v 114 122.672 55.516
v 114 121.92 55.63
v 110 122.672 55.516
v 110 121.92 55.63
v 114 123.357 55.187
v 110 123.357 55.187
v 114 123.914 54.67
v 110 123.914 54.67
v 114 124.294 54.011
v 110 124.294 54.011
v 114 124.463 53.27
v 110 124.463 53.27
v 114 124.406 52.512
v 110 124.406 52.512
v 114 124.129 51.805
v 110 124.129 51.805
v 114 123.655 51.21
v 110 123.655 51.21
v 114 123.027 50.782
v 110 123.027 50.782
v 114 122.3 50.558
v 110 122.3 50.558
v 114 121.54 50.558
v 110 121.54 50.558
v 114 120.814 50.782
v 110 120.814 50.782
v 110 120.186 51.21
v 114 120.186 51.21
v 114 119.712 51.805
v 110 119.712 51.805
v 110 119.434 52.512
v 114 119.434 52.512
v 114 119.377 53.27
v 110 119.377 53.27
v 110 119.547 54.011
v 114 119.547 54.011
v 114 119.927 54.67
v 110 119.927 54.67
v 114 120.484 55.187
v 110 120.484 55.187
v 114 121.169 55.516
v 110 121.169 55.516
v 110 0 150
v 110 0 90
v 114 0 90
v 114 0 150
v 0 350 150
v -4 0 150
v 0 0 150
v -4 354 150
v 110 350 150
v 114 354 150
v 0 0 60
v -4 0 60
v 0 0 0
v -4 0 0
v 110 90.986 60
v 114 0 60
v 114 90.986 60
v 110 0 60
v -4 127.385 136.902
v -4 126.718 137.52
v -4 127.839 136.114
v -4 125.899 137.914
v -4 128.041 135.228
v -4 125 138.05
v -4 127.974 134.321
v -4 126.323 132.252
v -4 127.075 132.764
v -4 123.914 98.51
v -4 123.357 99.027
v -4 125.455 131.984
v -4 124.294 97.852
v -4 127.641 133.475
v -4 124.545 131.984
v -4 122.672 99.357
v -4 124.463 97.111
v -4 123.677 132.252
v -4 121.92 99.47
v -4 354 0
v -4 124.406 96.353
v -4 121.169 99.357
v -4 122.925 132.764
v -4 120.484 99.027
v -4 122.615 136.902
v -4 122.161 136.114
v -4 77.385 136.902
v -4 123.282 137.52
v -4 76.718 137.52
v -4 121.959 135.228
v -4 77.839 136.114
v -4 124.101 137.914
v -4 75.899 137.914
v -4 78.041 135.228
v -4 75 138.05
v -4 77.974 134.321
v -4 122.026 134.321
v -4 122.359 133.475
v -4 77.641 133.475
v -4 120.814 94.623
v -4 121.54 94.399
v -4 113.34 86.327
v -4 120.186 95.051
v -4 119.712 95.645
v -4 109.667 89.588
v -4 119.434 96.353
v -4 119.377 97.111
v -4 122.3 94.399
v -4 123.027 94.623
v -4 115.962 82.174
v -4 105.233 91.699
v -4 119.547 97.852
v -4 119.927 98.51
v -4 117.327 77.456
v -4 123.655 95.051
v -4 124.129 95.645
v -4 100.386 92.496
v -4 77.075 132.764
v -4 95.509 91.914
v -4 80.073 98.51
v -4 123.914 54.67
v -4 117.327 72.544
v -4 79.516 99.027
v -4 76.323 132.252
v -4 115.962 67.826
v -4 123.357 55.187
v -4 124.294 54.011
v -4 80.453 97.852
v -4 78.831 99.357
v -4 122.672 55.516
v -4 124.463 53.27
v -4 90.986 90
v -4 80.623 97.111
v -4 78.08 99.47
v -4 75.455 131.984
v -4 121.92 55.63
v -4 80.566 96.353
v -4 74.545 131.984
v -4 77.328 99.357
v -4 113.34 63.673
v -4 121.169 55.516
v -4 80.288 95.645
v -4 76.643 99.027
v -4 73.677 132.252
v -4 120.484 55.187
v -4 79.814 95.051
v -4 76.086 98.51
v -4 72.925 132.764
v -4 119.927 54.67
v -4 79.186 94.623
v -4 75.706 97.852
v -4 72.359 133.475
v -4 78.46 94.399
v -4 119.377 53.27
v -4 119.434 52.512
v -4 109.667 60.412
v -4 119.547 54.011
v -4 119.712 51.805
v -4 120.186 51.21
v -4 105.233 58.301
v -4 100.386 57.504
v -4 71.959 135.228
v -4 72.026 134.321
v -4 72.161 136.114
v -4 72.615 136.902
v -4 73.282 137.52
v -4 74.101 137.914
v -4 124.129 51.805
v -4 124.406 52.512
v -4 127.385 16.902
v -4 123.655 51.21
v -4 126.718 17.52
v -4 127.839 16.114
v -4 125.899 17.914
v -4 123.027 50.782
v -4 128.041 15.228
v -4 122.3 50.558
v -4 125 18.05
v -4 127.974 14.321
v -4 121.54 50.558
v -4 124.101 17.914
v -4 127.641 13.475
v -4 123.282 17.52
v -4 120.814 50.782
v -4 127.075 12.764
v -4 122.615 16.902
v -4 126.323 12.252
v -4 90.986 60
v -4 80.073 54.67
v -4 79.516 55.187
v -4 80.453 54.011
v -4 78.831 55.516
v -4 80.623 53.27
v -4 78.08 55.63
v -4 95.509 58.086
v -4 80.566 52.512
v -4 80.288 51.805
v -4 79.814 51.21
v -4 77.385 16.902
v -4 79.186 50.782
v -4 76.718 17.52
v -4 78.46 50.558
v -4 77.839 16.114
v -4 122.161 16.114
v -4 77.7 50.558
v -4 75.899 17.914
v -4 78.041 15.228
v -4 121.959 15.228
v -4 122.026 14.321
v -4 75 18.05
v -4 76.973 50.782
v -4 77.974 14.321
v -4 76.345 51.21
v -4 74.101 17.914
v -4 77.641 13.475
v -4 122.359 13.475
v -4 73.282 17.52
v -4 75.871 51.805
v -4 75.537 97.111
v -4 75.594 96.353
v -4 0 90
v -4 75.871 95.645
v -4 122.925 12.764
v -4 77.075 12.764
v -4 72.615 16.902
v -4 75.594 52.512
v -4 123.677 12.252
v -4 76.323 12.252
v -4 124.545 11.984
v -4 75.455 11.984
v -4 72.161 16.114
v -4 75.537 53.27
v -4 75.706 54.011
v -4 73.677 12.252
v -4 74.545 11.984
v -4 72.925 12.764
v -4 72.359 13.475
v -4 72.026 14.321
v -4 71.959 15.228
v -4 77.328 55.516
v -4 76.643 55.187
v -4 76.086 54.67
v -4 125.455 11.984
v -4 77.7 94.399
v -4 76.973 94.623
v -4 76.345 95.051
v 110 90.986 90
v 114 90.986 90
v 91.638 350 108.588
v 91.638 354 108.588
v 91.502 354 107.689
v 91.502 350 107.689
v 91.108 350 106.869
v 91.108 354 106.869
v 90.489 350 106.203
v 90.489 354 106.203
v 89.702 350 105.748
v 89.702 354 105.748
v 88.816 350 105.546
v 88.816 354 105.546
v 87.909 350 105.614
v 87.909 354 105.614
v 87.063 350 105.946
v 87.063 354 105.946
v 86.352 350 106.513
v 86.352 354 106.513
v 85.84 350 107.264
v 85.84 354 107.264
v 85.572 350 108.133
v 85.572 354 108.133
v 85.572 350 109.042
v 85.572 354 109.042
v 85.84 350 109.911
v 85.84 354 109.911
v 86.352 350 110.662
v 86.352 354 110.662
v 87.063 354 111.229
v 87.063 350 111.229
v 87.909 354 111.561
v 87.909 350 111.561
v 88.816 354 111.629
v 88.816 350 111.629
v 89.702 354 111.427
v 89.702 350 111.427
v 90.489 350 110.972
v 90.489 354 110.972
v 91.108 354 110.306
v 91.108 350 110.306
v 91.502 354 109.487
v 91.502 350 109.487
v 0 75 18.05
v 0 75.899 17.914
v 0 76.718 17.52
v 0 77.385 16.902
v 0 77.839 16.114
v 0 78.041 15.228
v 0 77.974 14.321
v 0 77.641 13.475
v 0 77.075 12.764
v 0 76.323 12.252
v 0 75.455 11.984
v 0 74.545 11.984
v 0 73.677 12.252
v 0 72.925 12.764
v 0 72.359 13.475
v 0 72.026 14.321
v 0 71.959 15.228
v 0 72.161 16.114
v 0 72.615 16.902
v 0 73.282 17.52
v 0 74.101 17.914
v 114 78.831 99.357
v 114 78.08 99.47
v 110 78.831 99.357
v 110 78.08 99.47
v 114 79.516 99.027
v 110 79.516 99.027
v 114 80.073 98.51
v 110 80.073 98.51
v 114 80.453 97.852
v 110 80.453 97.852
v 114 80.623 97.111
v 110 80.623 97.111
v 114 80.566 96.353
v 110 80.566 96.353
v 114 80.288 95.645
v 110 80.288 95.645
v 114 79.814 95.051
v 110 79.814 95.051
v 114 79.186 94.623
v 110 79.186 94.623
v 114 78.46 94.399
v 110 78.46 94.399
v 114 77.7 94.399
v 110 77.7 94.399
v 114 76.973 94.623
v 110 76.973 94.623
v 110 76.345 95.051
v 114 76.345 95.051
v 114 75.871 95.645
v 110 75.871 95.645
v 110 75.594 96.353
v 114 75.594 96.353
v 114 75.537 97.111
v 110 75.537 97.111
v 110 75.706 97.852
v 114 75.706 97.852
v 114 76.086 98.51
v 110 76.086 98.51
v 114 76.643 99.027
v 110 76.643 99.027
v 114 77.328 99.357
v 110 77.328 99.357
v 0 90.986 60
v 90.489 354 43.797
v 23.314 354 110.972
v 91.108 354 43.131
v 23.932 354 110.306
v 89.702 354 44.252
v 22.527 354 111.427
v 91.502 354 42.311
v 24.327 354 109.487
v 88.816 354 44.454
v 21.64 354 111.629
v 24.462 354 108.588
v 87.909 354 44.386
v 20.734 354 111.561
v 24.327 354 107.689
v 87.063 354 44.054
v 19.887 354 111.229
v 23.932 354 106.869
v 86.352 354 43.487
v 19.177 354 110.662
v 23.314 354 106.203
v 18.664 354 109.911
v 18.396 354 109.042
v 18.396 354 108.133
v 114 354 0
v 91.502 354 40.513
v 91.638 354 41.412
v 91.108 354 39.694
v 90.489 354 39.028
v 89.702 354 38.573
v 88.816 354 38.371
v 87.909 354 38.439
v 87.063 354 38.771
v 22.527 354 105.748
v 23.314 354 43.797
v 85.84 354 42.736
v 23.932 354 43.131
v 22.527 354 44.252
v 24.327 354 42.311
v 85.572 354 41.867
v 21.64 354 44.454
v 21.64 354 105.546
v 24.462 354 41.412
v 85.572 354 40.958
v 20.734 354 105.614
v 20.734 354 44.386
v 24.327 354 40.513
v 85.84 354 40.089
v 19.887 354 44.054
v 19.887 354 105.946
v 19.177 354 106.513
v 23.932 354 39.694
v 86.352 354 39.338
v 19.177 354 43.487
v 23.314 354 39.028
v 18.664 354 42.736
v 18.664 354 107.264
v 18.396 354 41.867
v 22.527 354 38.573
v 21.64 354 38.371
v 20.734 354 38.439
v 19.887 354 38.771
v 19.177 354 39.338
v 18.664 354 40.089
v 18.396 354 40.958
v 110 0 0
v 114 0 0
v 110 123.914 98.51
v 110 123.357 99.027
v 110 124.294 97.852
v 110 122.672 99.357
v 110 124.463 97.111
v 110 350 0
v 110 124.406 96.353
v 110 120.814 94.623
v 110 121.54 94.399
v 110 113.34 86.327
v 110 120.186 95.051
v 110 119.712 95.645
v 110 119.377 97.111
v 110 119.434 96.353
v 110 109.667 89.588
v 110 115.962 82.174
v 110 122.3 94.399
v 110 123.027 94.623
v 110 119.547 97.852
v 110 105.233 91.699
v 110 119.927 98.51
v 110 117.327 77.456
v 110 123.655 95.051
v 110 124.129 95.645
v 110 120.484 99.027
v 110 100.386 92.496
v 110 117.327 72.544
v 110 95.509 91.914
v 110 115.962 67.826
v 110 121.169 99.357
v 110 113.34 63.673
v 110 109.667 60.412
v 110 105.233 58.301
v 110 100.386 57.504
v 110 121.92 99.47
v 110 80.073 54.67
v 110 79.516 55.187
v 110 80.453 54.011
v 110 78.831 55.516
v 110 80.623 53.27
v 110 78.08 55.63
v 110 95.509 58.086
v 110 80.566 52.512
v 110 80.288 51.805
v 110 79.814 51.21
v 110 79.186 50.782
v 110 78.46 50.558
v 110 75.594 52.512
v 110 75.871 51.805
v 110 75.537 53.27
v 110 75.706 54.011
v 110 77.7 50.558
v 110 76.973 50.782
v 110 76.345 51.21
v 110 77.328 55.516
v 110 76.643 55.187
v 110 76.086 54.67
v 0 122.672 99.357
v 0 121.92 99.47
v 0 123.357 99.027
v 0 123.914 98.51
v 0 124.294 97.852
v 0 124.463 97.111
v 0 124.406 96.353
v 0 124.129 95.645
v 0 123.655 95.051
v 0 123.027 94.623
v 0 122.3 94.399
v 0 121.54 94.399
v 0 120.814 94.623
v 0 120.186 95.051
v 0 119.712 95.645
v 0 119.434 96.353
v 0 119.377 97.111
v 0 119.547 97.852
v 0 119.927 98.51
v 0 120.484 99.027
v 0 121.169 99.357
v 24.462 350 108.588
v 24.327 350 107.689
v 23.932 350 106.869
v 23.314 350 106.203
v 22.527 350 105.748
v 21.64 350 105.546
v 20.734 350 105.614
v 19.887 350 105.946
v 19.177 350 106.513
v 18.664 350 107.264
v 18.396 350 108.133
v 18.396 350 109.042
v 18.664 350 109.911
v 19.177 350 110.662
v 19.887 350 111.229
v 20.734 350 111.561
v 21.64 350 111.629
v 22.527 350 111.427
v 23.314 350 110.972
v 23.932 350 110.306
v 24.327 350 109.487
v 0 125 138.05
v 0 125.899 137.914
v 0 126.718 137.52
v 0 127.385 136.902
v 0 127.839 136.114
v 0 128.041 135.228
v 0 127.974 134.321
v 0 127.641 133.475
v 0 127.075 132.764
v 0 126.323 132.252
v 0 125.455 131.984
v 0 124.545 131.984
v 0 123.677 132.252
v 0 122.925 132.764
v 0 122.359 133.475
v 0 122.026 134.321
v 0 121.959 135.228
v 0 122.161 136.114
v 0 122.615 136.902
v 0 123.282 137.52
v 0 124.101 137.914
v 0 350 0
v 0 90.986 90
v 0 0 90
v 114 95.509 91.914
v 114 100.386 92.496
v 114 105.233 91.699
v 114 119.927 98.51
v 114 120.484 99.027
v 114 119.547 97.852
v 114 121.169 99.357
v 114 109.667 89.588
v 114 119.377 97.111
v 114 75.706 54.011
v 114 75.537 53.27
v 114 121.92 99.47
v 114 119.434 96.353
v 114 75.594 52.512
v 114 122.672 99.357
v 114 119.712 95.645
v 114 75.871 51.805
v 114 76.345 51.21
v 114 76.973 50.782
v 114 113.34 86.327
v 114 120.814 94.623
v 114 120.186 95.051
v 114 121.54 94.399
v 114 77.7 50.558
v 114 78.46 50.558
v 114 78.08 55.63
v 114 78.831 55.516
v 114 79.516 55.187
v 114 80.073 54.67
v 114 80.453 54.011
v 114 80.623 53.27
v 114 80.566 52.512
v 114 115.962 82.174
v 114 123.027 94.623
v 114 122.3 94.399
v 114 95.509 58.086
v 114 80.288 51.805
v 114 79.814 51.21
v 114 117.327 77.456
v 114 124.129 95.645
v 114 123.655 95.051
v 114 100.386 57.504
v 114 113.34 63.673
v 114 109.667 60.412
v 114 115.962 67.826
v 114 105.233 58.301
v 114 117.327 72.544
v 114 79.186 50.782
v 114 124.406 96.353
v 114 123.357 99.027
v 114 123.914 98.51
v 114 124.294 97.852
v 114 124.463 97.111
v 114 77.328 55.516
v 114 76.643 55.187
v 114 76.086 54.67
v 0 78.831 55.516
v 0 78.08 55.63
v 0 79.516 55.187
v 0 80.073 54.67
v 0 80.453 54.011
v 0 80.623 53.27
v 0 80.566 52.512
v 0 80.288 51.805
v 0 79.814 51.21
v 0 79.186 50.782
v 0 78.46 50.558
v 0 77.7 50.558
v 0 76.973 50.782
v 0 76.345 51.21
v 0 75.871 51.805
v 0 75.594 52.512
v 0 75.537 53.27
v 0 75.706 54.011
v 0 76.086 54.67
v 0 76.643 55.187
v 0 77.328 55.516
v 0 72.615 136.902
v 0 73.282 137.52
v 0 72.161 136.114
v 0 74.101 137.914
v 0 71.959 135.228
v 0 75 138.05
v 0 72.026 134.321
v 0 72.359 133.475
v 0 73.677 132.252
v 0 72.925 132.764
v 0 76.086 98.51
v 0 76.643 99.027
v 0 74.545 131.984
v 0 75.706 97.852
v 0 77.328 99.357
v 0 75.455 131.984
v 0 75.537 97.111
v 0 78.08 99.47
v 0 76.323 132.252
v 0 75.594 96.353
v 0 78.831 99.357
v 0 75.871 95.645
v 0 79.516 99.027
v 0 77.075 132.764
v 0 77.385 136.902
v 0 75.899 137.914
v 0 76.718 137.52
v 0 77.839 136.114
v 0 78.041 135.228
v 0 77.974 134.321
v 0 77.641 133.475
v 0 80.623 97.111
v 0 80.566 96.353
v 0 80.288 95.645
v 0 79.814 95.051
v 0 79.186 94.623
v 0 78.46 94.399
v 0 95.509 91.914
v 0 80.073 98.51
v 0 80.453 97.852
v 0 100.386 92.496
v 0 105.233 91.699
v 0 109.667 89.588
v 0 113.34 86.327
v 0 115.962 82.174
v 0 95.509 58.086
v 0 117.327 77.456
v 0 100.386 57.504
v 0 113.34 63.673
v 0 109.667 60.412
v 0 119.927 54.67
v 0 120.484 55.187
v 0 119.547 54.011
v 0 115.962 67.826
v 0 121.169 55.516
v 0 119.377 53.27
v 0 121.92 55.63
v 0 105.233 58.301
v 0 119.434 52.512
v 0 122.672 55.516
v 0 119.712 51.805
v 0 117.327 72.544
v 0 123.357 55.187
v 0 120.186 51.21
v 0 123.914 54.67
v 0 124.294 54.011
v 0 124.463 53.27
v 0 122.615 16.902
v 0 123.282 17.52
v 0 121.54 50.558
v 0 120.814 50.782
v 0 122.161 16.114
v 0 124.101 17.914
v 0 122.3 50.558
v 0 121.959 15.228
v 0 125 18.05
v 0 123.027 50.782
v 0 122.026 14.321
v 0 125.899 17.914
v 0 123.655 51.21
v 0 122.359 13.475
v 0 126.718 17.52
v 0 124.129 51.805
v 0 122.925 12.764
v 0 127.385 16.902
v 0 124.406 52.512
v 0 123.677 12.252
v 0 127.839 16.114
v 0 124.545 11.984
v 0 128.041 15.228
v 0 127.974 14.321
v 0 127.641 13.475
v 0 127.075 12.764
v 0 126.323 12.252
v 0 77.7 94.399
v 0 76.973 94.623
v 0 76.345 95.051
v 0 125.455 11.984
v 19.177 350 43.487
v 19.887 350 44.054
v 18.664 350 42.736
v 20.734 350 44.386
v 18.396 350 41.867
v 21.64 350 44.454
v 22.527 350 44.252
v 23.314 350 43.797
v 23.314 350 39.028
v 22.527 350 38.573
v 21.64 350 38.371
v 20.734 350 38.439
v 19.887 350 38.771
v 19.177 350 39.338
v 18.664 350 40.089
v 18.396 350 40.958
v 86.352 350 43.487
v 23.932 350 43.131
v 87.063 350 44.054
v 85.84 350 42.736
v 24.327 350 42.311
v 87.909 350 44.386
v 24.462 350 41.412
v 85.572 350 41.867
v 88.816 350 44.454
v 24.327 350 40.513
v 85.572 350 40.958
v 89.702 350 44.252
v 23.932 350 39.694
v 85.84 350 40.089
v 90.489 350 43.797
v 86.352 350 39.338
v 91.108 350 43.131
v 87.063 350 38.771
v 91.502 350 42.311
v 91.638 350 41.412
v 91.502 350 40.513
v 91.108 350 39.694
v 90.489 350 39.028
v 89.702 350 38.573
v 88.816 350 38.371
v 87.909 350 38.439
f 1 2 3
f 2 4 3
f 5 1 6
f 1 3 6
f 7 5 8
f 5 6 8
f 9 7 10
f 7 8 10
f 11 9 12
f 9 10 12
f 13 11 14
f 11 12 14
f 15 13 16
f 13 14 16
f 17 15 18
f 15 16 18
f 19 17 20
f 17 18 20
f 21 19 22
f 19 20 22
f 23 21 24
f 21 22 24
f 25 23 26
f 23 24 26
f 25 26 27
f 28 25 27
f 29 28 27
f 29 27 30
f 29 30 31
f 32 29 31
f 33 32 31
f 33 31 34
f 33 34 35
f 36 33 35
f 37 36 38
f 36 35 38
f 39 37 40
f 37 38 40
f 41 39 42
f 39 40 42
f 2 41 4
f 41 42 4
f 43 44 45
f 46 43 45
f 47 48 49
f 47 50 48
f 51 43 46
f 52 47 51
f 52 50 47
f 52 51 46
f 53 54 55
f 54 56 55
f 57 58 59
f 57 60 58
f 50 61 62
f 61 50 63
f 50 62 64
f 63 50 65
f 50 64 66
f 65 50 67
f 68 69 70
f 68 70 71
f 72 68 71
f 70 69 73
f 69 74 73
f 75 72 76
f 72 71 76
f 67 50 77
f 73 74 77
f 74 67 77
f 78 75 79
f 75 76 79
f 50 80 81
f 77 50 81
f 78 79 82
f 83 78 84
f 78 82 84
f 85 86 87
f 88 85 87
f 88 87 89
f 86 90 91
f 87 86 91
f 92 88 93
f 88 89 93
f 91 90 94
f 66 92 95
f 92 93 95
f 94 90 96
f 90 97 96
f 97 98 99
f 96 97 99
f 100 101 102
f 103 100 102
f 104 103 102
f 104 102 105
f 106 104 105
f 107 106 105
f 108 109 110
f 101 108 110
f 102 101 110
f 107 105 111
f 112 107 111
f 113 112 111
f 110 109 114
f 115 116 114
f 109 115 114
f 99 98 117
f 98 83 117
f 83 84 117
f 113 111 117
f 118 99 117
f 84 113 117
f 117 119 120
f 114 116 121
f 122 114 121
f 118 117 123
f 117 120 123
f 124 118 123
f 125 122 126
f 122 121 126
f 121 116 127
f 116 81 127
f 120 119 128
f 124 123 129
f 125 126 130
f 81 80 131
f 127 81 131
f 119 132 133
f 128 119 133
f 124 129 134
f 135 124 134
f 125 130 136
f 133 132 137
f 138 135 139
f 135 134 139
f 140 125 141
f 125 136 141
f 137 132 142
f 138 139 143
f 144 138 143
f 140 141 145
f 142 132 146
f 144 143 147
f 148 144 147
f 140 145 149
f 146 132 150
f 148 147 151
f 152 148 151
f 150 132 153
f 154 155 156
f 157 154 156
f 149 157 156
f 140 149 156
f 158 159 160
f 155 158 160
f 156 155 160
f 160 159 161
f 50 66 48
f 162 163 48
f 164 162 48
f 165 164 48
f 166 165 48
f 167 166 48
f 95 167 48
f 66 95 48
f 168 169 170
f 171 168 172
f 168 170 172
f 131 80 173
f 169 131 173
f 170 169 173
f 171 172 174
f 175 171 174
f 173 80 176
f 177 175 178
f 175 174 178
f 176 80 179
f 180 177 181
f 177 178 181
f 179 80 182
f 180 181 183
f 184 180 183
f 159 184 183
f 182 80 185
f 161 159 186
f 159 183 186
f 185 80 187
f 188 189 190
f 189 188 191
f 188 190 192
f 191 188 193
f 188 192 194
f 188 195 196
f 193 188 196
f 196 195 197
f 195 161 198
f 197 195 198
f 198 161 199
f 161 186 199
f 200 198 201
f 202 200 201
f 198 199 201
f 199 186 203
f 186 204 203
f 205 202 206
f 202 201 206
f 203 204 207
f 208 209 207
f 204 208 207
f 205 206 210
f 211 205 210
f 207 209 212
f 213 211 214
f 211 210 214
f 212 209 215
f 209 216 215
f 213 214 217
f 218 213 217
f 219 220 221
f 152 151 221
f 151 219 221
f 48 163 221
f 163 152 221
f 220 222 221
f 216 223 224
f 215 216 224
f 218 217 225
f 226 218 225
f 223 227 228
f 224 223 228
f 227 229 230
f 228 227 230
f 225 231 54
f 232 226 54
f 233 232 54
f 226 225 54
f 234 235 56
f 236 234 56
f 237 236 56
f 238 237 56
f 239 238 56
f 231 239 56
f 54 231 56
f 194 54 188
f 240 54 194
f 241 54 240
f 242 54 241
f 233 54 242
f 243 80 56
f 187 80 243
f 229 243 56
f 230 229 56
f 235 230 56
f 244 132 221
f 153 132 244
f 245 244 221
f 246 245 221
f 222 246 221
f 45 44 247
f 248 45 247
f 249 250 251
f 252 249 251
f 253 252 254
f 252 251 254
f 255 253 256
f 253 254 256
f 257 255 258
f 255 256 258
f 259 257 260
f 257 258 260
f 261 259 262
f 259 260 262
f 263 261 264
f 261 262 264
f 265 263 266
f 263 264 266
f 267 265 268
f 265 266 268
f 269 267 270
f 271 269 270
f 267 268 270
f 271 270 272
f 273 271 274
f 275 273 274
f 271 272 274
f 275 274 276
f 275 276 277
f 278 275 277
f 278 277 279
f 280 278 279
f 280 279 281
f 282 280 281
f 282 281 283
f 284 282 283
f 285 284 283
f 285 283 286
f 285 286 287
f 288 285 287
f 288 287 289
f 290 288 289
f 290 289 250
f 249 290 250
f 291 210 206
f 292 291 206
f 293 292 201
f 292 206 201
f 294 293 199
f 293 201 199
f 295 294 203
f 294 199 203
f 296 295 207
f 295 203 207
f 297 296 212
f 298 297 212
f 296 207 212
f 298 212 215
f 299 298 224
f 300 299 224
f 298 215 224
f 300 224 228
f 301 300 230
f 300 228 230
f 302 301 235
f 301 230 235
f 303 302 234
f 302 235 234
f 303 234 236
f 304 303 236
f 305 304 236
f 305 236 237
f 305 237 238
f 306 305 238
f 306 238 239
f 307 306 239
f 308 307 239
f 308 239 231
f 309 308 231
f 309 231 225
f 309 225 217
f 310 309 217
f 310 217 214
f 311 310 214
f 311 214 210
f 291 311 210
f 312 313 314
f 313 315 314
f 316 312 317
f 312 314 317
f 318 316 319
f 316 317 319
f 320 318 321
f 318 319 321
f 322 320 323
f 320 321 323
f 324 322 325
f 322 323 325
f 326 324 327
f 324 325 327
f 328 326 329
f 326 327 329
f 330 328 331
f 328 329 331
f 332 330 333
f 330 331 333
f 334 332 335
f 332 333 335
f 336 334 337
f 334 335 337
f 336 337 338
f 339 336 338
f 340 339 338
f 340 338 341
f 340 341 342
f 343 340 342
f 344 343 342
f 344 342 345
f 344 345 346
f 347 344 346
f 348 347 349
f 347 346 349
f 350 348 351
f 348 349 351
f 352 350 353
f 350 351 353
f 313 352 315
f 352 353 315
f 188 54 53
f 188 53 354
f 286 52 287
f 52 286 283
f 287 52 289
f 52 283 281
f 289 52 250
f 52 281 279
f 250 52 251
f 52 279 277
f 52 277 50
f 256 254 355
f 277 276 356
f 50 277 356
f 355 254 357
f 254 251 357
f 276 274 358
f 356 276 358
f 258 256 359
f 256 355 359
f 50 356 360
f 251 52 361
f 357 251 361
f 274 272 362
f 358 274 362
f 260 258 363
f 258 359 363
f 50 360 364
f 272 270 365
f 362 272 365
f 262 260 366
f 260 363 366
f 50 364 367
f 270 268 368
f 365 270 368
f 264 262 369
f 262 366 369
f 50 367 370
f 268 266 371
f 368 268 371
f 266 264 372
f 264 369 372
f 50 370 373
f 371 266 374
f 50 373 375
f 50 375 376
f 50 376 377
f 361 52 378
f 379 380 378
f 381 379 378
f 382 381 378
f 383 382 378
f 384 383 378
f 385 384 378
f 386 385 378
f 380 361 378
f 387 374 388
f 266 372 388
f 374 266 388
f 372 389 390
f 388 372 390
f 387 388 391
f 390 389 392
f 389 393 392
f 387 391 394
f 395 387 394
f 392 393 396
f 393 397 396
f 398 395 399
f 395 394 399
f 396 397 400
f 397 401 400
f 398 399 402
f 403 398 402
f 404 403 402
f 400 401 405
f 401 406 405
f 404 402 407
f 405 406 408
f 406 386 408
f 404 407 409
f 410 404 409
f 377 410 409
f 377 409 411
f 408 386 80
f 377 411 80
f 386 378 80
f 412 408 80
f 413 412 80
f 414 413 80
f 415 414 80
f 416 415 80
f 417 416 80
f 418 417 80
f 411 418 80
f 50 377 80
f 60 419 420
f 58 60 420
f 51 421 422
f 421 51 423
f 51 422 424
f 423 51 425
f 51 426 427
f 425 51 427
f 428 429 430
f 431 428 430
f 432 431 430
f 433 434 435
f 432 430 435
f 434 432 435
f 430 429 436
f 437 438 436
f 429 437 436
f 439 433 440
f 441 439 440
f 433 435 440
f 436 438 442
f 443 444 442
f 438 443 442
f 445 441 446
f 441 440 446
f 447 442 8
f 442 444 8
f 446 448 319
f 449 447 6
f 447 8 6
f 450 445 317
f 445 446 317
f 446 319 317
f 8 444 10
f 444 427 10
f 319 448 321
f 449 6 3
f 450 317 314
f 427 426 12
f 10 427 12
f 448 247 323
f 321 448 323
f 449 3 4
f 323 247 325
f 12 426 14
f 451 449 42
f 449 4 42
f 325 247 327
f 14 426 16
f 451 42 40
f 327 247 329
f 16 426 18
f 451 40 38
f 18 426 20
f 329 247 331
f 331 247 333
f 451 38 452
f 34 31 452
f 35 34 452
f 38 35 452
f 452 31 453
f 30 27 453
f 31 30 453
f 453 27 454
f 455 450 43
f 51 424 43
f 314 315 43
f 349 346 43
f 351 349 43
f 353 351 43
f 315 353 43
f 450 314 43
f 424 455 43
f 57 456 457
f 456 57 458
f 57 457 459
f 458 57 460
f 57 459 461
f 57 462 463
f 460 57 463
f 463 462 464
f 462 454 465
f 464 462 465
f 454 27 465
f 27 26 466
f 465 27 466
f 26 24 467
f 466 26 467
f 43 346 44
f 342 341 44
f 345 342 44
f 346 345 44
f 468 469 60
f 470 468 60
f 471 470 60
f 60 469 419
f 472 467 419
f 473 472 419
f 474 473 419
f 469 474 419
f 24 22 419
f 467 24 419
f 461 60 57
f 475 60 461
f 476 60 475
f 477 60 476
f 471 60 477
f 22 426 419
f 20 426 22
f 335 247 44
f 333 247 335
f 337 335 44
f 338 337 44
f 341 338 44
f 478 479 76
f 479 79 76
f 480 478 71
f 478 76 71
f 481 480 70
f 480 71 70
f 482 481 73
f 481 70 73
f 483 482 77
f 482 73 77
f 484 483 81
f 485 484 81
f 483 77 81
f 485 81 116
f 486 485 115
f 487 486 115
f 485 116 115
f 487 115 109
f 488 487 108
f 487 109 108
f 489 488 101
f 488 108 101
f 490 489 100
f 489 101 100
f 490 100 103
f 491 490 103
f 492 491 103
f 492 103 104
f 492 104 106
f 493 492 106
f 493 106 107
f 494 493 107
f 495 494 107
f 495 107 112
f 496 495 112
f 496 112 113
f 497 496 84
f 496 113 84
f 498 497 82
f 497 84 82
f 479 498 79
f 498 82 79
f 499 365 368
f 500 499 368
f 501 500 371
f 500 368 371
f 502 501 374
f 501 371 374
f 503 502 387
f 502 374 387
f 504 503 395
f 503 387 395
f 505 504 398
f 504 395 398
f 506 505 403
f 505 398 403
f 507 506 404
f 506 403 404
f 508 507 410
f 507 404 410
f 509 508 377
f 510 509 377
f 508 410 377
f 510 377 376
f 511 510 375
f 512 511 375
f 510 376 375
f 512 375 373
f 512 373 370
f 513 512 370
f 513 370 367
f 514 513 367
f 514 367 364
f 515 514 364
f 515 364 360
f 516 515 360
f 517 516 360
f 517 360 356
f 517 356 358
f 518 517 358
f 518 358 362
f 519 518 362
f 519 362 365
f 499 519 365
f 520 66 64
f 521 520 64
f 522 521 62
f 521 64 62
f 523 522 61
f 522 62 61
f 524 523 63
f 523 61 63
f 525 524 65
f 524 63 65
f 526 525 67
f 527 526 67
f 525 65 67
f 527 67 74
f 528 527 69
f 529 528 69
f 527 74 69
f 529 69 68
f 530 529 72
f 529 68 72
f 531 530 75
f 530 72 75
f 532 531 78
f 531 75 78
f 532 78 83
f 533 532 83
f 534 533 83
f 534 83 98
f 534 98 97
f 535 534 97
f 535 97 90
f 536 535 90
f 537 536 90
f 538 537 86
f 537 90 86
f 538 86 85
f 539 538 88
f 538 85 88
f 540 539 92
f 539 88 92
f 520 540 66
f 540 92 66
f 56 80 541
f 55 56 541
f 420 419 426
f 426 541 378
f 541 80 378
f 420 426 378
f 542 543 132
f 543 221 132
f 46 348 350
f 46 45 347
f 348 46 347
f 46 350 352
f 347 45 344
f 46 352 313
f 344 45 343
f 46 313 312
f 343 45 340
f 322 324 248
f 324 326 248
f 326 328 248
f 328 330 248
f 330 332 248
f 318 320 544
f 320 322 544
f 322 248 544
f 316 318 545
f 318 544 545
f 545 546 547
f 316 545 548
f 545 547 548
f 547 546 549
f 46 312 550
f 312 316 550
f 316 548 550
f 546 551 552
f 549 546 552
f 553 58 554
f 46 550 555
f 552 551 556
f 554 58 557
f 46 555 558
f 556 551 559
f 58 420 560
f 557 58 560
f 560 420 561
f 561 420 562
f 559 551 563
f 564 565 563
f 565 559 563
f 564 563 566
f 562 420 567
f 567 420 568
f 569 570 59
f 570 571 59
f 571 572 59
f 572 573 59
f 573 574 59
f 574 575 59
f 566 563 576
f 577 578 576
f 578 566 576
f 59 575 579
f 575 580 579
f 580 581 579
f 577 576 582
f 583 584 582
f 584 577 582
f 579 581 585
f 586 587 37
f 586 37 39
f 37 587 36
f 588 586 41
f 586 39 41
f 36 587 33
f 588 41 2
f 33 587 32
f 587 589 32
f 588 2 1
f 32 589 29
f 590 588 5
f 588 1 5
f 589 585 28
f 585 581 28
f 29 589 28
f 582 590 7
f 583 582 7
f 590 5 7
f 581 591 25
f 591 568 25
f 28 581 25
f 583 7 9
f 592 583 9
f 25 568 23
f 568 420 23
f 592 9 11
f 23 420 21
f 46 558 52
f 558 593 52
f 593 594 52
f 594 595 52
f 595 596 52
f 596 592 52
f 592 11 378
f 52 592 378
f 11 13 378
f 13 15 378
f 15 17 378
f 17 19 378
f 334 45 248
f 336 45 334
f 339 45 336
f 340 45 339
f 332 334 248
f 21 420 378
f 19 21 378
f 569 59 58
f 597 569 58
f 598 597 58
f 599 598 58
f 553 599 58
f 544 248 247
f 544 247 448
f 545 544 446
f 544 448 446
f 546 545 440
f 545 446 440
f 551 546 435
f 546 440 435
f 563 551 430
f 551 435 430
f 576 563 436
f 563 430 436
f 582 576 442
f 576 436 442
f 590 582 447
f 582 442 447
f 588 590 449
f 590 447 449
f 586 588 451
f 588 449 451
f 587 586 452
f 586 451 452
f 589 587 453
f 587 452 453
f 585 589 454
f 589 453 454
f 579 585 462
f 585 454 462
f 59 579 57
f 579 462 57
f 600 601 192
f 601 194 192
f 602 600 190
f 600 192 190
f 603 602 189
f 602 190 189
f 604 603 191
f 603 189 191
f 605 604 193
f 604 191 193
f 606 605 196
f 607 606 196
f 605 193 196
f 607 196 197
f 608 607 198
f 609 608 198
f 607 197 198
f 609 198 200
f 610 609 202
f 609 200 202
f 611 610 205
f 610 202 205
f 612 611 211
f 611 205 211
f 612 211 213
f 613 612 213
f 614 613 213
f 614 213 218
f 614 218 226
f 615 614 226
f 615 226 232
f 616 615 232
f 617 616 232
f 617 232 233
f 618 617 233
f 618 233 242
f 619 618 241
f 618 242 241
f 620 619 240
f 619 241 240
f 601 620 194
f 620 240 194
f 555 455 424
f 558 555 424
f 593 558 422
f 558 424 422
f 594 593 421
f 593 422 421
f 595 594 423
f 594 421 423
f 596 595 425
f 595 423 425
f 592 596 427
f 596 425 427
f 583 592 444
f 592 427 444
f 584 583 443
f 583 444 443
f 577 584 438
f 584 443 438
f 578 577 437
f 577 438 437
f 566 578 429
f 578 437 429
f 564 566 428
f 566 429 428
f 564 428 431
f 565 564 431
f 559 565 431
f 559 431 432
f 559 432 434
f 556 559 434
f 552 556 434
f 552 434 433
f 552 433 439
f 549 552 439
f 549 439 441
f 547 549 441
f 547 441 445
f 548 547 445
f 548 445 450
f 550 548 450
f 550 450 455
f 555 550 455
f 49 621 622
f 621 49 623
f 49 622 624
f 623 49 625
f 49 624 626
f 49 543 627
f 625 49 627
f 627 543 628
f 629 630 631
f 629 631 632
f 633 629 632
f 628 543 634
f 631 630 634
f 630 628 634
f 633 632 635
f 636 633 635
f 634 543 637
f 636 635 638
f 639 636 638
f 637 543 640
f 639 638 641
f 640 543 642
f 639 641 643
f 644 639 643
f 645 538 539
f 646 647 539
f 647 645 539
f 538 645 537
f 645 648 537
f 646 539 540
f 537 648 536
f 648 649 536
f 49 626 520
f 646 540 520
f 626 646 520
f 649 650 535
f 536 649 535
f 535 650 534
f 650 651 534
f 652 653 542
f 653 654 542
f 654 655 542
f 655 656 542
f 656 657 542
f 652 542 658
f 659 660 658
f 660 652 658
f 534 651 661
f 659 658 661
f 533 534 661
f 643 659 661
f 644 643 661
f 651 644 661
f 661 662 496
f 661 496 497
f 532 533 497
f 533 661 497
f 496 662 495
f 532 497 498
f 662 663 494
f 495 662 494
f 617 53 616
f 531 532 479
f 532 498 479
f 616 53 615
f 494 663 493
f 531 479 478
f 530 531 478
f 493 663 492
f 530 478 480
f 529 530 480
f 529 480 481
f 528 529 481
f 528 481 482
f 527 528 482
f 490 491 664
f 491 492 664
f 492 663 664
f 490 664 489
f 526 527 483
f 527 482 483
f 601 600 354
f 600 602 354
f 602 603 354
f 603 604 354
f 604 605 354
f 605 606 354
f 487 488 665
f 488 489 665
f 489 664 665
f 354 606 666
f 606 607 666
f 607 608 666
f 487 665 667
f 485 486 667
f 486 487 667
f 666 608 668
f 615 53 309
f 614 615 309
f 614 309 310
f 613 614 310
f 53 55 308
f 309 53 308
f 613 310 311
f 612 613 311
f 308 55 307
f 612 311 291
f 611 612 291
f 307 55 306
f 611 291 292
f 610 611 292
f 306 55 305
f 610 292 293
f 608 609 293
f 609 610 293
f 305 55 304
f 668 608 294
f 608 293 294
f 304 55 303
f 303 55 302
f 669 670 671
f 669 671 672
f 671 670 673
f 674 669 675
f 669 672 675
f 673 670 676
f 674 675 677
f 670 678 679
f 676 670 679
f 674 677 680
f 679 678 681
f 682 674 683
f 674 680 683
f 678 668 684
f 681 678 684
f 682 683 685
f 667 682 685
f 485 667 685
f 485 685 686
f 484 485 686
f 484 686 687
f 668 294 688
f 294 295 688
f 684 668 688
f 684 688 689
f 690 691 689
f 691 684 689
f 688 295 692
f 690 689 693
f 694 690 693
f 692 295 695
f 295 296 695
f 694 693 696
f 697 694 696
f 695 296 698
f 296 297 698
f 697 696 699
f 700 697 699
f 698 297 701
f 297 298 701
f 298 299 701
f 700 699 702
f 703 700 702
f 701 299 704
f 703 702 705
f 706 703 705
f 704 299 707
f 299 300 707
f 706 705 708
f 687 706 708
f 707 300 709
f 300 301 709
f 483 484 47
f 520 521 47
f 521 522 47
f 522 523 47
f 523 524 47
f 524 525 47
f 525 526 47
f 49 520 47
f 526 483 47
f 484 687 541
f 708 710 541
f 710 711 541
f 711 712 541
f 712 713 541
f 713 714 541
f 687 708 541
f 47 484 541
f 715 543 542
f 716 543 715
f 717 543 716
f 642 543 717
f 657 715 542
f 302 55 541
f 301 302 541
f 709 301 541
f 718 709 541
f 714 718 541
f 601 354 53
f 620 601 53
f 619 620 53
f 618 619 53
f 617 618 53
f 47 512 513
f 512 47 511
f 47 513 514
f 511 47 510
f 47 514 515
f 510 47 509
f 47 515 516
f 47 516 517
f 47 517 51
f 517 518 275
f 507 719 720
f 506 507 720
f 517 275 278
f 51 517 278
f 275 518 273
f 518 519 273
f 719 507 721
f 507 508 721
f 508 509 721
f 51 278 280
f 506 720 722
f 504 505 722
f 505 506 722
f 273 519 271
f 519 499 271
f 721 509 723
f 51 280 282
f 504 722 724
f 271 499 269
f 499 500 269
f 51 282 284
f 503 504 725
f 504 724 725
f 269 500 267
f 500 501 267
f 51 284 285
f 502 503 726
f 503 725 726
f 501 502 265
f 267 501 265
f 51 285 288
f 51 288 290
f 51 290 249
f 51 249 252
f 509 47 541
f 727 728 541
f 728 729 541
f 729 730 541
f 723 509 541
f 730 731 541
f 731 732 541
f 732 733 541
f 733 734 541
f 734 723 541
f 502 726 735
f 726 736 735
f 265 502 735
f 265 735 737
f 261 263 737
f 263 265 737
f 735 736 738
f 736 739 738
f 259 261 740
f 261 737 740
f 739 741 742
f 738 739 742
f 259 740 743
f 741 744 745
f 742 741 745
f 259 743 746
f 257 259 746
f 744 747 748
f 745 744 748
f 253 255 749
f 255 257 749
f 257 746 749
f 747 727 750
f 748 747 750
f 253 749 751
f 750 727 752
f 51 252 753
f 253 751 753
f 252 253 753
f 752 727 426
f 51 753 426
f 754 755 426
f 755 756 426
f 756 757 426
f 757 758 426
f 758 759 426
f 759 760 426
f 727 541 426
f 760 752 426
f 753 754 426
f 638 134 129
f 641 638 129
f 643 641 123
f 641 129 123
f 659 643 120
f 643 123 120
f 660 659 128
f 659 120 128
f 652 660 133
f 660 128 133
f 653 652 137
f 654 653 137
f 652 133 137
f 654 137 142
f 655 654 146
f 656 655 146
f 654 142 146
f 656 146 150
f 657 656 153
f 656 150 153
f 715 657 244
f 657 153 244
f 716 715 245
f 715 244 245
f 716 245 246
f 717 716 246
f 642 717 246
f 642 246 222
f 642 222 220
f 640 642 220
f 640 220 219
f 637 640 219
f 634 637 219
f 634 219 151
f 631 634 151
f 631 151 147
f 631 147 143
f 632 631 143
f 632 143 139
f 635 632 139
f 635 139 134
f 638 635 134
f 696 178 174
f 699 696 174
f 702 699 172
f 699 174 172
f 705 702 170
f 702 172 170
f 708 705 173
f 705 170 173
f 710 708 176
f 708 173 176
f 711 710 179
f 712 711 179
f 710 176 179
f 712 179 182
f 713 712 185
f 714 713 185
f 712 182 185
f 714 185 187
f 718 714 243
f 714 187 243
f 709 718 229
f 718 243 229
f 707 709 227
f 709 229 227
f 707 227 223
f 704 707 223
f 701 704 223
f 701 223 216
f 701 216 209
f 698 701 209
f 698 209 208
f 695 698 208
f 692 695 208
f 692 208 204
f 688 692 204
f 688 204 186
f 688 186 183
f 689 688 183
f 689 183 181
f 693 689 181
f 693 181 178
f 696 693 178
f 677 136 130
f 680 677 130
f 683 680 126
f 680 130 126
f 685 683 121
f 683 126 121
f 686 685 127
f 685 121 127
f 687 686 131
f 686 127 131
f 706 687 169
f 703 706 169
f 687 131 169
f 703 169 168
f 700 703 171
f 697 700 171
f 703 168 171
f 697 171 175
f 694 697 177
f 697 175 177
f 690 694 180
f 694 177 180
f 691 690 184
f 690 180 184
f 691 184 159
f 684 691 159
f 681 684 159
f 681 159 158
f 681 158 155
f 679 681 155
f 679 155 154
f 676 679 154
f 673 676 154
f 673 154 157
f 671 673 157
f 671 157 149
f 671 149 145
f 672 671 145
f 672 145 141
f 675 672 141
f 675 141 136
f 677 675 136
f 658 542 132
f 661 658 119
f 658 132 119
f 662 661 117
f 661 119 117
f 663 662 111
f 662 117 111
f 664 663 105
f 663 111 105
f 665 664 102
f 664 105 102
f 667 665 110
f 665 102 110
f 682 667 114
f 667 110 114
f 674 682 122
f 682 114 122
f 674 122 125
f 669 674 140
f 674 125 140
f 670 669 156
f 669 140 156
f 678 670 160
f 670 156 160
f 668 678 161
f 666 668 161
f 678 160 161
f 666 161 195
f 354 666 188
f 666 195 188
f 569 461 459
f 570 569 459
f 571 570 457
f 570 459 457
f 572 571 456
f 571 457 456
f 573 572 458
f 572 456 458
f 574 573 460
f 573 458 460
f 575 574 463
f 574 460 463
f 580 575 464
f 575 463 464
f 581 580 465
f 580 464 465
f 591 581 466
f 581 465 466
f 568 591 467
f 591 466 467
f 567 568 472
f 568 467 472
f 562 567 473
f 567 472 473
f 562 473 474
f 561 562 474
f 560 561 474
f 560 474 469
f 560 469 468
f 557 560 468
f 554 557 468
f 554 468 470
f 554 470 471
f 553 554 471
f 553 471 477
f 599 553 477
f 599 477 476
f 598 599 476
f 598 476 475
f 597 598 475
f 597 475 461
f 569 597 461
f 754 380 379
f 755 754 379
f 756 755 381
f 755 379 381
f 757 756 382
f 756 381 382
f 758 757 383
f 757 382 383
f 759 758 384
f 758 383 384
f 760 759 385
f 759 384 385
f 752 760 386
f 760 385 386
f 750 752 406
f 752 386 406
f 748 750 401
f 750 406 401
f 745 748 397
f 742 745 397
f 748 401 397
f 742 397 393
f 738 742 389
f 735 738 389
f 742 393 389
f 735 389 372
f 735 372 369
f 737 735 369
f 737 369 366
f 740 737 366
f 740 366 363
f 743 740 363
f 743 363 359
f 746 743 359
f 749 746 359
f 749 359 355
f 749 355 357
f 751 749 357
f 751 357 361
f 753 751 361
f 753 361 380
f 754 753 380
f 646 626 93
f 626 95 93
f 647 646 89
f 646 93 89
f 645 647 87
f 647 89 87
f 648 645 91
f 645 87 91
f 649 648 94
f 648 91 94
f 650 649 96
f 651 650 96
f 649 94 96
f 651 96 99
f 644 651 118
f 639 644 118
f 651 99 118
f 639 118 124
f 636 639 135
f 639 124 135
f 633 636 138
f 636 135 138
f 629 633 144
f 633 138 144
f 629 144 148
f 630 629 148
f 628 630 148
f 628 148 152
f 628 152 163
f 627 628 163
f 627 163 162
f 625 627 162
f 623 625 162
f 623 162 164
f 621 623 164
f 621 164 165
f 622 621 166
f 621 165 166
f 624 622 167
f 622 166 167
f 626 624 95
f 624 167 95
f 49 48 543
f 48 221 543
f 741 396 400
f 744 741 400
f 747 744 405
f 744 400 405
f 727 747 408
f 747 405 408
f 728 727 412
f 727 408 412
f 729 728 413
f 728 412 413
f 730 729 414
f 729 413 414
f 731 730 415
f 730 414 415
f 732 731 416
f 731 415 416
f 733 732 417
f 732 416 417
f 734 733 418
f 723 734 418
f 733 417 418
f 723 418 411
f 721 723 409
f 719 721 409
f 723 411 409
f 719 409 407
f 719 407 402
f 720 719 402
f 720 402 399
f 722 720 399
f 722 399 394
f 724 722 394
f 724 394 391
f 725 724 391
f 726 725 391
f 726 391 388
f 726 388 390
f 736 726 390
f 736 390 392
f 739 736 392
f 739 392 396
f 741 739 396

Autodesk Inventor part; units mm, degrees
ref_plane "YZ Plane" through (0, 0, 0) normal (1, 0, 0) x (0, 1, 0)
ref_plane "XZ Plane" through (0, 0, 0) normal (0, 1, 0) x (-1, 0, 0)
sketch "Sketch1" plane through (0, 0, 0) normal (0, 0, 1) x (1, 0, 0)
  line L0 (0, 0) -> (0, 350)
  line L1 (0, 350) -> (110, 350)
  line L2 (110, 350) -> (110, 0)
  line L3 (114, 0) -> (114, 354)
  line L4 (114, 354) -> (-4, 354)
  line L5 (-4, 354) -> (-4, 0)
  line L6 (-4, 0) -> (0, 0)
  line L7 (110, 0) -> (114, 0)
  dimension "d0" = 350
  dimension "d1" = 110
  dimension "d2" = 4
extrude "Extrusion1" add sketch "Sketch1" along normal blind 150
sketch "Sketch2" plane through (-4, 0, 0) normal (-1, 0, 0) x (0, 0, 1)
  line L0 (0, 354) -> (150, 354) projected
  line L1 (0, 0) -> (150, 0) projected
  line L2 (75, 0) -> (75, 100) construction
  circle A0 centre (75, 100) radius 17.5
  line L3 (60, 0) -> (60, 90.9861)
  line L4 (90, 0) -> (90, 90.9861)
  circle A1 centre (100, 100) radius 31 construction
  line L5 (75, 100) -> (53.0797, 121.9203) construction
  circle A2 centre (53.0797, 121.9203) radius 2.55
  circle A3 centre (53.0797, 78.0797) radius 2.55
  circle A4 centre (96.9203, 78.0797) radius 2.55
  circle A5 centre (96.9203, 121.9203) radius 2.55
  point P0 (60, 0)
  point P1 (90, 0)
  dimension "d5" = 100
  dimension "d6" = 15
  dimension "d7" = 15
  dimension "d12" = 35
  dimension "d13" = 62
  dimension "d23" = 5.1
  dimension "d26" = 360
extrude "Extrusion2" cut sketch "Sketch2" against normal blind 200
sketch "Sketch4" plane through (-4, 0, 0) normal (-1, 0, 0) x (0, 0, 1)
  arc A0 (90, 90.9861) -> (60, 90.9861) centre (75, 100) ccw construction
  line L0 (15, 75) -> (135, 75) construction
  line L1 (135, 75) -> (135, 125) construction
  line L2 (135, 125) -> (15, 125) construction
  line L3 (15, 125) -> (15, 75) construction
  line L4 (15, 75) -> (135, 125) construction
  line L5 (135, 75) -> (15, 125) construction
  circle A1 centre (15, 125) radius 3.05
  circle A2 centre (15, 75) radius 3.05
  circle A3 centre (135, 75) radius 3.05
  circle A4 centre (135, 125) radius 3.05
  point P0 (0, 0)
  dimension "d33" = 120
  dimension "d34" = 50
  dimension "d35" = 6.1
extrude "Extrusion4" cut sketch "Sketch4" against normal blind 5
ref_plane "Work Plane1" through (55, 0, 0) normal (1, 0, 0) x (0, 0, -1)
sketch "Sketch5" plane through (-4, 354, 0) normal (0, 1, 0) x (1, 0, 0)
  line L0 (118, 0) -> (0, 0) projected
  line L1 (0, 0) -> (0, -150) projected
  line L2 (118, -150) -> (0, -150) projected
  line L3 (118, 0) -> (118, -150) projected
  line L4 (4, -150) -> (114, -150) projected
  line L5 (59, -150) -> (59, 0) construction
  line L6 (4, 0) -> (114, 0) projected
  circle A0 centre (59, -75) radius 5
  circle A1 centre (59, -75) radius 47.5 construction
  line L7 (59, -75) -> (11.5, -75) construction
  line L8 (59, -75) -> (25.4124, -108.5876) construction
  circle A2 centre (25.4124, -108.5876) radius 3.05
  circle A3 centre (92.5876, -108.5876) radius 3.05
  circle A4 centre (92.5876, -41.4124) radius 3.05
  circle A5 centre (25.4124, -41.4124) radius 3.05
  dimension "d38" = 10
  dimension "d41" = 95
  dimension "d42" = 6.1
  dimension "d43" = 45
  dimension "d46" = 360
extrude "Extrusion5" cut sketch "Sketch5" against normal blind 20 contours A2 | A3 | A4 | A5
properties part number "CShape"
